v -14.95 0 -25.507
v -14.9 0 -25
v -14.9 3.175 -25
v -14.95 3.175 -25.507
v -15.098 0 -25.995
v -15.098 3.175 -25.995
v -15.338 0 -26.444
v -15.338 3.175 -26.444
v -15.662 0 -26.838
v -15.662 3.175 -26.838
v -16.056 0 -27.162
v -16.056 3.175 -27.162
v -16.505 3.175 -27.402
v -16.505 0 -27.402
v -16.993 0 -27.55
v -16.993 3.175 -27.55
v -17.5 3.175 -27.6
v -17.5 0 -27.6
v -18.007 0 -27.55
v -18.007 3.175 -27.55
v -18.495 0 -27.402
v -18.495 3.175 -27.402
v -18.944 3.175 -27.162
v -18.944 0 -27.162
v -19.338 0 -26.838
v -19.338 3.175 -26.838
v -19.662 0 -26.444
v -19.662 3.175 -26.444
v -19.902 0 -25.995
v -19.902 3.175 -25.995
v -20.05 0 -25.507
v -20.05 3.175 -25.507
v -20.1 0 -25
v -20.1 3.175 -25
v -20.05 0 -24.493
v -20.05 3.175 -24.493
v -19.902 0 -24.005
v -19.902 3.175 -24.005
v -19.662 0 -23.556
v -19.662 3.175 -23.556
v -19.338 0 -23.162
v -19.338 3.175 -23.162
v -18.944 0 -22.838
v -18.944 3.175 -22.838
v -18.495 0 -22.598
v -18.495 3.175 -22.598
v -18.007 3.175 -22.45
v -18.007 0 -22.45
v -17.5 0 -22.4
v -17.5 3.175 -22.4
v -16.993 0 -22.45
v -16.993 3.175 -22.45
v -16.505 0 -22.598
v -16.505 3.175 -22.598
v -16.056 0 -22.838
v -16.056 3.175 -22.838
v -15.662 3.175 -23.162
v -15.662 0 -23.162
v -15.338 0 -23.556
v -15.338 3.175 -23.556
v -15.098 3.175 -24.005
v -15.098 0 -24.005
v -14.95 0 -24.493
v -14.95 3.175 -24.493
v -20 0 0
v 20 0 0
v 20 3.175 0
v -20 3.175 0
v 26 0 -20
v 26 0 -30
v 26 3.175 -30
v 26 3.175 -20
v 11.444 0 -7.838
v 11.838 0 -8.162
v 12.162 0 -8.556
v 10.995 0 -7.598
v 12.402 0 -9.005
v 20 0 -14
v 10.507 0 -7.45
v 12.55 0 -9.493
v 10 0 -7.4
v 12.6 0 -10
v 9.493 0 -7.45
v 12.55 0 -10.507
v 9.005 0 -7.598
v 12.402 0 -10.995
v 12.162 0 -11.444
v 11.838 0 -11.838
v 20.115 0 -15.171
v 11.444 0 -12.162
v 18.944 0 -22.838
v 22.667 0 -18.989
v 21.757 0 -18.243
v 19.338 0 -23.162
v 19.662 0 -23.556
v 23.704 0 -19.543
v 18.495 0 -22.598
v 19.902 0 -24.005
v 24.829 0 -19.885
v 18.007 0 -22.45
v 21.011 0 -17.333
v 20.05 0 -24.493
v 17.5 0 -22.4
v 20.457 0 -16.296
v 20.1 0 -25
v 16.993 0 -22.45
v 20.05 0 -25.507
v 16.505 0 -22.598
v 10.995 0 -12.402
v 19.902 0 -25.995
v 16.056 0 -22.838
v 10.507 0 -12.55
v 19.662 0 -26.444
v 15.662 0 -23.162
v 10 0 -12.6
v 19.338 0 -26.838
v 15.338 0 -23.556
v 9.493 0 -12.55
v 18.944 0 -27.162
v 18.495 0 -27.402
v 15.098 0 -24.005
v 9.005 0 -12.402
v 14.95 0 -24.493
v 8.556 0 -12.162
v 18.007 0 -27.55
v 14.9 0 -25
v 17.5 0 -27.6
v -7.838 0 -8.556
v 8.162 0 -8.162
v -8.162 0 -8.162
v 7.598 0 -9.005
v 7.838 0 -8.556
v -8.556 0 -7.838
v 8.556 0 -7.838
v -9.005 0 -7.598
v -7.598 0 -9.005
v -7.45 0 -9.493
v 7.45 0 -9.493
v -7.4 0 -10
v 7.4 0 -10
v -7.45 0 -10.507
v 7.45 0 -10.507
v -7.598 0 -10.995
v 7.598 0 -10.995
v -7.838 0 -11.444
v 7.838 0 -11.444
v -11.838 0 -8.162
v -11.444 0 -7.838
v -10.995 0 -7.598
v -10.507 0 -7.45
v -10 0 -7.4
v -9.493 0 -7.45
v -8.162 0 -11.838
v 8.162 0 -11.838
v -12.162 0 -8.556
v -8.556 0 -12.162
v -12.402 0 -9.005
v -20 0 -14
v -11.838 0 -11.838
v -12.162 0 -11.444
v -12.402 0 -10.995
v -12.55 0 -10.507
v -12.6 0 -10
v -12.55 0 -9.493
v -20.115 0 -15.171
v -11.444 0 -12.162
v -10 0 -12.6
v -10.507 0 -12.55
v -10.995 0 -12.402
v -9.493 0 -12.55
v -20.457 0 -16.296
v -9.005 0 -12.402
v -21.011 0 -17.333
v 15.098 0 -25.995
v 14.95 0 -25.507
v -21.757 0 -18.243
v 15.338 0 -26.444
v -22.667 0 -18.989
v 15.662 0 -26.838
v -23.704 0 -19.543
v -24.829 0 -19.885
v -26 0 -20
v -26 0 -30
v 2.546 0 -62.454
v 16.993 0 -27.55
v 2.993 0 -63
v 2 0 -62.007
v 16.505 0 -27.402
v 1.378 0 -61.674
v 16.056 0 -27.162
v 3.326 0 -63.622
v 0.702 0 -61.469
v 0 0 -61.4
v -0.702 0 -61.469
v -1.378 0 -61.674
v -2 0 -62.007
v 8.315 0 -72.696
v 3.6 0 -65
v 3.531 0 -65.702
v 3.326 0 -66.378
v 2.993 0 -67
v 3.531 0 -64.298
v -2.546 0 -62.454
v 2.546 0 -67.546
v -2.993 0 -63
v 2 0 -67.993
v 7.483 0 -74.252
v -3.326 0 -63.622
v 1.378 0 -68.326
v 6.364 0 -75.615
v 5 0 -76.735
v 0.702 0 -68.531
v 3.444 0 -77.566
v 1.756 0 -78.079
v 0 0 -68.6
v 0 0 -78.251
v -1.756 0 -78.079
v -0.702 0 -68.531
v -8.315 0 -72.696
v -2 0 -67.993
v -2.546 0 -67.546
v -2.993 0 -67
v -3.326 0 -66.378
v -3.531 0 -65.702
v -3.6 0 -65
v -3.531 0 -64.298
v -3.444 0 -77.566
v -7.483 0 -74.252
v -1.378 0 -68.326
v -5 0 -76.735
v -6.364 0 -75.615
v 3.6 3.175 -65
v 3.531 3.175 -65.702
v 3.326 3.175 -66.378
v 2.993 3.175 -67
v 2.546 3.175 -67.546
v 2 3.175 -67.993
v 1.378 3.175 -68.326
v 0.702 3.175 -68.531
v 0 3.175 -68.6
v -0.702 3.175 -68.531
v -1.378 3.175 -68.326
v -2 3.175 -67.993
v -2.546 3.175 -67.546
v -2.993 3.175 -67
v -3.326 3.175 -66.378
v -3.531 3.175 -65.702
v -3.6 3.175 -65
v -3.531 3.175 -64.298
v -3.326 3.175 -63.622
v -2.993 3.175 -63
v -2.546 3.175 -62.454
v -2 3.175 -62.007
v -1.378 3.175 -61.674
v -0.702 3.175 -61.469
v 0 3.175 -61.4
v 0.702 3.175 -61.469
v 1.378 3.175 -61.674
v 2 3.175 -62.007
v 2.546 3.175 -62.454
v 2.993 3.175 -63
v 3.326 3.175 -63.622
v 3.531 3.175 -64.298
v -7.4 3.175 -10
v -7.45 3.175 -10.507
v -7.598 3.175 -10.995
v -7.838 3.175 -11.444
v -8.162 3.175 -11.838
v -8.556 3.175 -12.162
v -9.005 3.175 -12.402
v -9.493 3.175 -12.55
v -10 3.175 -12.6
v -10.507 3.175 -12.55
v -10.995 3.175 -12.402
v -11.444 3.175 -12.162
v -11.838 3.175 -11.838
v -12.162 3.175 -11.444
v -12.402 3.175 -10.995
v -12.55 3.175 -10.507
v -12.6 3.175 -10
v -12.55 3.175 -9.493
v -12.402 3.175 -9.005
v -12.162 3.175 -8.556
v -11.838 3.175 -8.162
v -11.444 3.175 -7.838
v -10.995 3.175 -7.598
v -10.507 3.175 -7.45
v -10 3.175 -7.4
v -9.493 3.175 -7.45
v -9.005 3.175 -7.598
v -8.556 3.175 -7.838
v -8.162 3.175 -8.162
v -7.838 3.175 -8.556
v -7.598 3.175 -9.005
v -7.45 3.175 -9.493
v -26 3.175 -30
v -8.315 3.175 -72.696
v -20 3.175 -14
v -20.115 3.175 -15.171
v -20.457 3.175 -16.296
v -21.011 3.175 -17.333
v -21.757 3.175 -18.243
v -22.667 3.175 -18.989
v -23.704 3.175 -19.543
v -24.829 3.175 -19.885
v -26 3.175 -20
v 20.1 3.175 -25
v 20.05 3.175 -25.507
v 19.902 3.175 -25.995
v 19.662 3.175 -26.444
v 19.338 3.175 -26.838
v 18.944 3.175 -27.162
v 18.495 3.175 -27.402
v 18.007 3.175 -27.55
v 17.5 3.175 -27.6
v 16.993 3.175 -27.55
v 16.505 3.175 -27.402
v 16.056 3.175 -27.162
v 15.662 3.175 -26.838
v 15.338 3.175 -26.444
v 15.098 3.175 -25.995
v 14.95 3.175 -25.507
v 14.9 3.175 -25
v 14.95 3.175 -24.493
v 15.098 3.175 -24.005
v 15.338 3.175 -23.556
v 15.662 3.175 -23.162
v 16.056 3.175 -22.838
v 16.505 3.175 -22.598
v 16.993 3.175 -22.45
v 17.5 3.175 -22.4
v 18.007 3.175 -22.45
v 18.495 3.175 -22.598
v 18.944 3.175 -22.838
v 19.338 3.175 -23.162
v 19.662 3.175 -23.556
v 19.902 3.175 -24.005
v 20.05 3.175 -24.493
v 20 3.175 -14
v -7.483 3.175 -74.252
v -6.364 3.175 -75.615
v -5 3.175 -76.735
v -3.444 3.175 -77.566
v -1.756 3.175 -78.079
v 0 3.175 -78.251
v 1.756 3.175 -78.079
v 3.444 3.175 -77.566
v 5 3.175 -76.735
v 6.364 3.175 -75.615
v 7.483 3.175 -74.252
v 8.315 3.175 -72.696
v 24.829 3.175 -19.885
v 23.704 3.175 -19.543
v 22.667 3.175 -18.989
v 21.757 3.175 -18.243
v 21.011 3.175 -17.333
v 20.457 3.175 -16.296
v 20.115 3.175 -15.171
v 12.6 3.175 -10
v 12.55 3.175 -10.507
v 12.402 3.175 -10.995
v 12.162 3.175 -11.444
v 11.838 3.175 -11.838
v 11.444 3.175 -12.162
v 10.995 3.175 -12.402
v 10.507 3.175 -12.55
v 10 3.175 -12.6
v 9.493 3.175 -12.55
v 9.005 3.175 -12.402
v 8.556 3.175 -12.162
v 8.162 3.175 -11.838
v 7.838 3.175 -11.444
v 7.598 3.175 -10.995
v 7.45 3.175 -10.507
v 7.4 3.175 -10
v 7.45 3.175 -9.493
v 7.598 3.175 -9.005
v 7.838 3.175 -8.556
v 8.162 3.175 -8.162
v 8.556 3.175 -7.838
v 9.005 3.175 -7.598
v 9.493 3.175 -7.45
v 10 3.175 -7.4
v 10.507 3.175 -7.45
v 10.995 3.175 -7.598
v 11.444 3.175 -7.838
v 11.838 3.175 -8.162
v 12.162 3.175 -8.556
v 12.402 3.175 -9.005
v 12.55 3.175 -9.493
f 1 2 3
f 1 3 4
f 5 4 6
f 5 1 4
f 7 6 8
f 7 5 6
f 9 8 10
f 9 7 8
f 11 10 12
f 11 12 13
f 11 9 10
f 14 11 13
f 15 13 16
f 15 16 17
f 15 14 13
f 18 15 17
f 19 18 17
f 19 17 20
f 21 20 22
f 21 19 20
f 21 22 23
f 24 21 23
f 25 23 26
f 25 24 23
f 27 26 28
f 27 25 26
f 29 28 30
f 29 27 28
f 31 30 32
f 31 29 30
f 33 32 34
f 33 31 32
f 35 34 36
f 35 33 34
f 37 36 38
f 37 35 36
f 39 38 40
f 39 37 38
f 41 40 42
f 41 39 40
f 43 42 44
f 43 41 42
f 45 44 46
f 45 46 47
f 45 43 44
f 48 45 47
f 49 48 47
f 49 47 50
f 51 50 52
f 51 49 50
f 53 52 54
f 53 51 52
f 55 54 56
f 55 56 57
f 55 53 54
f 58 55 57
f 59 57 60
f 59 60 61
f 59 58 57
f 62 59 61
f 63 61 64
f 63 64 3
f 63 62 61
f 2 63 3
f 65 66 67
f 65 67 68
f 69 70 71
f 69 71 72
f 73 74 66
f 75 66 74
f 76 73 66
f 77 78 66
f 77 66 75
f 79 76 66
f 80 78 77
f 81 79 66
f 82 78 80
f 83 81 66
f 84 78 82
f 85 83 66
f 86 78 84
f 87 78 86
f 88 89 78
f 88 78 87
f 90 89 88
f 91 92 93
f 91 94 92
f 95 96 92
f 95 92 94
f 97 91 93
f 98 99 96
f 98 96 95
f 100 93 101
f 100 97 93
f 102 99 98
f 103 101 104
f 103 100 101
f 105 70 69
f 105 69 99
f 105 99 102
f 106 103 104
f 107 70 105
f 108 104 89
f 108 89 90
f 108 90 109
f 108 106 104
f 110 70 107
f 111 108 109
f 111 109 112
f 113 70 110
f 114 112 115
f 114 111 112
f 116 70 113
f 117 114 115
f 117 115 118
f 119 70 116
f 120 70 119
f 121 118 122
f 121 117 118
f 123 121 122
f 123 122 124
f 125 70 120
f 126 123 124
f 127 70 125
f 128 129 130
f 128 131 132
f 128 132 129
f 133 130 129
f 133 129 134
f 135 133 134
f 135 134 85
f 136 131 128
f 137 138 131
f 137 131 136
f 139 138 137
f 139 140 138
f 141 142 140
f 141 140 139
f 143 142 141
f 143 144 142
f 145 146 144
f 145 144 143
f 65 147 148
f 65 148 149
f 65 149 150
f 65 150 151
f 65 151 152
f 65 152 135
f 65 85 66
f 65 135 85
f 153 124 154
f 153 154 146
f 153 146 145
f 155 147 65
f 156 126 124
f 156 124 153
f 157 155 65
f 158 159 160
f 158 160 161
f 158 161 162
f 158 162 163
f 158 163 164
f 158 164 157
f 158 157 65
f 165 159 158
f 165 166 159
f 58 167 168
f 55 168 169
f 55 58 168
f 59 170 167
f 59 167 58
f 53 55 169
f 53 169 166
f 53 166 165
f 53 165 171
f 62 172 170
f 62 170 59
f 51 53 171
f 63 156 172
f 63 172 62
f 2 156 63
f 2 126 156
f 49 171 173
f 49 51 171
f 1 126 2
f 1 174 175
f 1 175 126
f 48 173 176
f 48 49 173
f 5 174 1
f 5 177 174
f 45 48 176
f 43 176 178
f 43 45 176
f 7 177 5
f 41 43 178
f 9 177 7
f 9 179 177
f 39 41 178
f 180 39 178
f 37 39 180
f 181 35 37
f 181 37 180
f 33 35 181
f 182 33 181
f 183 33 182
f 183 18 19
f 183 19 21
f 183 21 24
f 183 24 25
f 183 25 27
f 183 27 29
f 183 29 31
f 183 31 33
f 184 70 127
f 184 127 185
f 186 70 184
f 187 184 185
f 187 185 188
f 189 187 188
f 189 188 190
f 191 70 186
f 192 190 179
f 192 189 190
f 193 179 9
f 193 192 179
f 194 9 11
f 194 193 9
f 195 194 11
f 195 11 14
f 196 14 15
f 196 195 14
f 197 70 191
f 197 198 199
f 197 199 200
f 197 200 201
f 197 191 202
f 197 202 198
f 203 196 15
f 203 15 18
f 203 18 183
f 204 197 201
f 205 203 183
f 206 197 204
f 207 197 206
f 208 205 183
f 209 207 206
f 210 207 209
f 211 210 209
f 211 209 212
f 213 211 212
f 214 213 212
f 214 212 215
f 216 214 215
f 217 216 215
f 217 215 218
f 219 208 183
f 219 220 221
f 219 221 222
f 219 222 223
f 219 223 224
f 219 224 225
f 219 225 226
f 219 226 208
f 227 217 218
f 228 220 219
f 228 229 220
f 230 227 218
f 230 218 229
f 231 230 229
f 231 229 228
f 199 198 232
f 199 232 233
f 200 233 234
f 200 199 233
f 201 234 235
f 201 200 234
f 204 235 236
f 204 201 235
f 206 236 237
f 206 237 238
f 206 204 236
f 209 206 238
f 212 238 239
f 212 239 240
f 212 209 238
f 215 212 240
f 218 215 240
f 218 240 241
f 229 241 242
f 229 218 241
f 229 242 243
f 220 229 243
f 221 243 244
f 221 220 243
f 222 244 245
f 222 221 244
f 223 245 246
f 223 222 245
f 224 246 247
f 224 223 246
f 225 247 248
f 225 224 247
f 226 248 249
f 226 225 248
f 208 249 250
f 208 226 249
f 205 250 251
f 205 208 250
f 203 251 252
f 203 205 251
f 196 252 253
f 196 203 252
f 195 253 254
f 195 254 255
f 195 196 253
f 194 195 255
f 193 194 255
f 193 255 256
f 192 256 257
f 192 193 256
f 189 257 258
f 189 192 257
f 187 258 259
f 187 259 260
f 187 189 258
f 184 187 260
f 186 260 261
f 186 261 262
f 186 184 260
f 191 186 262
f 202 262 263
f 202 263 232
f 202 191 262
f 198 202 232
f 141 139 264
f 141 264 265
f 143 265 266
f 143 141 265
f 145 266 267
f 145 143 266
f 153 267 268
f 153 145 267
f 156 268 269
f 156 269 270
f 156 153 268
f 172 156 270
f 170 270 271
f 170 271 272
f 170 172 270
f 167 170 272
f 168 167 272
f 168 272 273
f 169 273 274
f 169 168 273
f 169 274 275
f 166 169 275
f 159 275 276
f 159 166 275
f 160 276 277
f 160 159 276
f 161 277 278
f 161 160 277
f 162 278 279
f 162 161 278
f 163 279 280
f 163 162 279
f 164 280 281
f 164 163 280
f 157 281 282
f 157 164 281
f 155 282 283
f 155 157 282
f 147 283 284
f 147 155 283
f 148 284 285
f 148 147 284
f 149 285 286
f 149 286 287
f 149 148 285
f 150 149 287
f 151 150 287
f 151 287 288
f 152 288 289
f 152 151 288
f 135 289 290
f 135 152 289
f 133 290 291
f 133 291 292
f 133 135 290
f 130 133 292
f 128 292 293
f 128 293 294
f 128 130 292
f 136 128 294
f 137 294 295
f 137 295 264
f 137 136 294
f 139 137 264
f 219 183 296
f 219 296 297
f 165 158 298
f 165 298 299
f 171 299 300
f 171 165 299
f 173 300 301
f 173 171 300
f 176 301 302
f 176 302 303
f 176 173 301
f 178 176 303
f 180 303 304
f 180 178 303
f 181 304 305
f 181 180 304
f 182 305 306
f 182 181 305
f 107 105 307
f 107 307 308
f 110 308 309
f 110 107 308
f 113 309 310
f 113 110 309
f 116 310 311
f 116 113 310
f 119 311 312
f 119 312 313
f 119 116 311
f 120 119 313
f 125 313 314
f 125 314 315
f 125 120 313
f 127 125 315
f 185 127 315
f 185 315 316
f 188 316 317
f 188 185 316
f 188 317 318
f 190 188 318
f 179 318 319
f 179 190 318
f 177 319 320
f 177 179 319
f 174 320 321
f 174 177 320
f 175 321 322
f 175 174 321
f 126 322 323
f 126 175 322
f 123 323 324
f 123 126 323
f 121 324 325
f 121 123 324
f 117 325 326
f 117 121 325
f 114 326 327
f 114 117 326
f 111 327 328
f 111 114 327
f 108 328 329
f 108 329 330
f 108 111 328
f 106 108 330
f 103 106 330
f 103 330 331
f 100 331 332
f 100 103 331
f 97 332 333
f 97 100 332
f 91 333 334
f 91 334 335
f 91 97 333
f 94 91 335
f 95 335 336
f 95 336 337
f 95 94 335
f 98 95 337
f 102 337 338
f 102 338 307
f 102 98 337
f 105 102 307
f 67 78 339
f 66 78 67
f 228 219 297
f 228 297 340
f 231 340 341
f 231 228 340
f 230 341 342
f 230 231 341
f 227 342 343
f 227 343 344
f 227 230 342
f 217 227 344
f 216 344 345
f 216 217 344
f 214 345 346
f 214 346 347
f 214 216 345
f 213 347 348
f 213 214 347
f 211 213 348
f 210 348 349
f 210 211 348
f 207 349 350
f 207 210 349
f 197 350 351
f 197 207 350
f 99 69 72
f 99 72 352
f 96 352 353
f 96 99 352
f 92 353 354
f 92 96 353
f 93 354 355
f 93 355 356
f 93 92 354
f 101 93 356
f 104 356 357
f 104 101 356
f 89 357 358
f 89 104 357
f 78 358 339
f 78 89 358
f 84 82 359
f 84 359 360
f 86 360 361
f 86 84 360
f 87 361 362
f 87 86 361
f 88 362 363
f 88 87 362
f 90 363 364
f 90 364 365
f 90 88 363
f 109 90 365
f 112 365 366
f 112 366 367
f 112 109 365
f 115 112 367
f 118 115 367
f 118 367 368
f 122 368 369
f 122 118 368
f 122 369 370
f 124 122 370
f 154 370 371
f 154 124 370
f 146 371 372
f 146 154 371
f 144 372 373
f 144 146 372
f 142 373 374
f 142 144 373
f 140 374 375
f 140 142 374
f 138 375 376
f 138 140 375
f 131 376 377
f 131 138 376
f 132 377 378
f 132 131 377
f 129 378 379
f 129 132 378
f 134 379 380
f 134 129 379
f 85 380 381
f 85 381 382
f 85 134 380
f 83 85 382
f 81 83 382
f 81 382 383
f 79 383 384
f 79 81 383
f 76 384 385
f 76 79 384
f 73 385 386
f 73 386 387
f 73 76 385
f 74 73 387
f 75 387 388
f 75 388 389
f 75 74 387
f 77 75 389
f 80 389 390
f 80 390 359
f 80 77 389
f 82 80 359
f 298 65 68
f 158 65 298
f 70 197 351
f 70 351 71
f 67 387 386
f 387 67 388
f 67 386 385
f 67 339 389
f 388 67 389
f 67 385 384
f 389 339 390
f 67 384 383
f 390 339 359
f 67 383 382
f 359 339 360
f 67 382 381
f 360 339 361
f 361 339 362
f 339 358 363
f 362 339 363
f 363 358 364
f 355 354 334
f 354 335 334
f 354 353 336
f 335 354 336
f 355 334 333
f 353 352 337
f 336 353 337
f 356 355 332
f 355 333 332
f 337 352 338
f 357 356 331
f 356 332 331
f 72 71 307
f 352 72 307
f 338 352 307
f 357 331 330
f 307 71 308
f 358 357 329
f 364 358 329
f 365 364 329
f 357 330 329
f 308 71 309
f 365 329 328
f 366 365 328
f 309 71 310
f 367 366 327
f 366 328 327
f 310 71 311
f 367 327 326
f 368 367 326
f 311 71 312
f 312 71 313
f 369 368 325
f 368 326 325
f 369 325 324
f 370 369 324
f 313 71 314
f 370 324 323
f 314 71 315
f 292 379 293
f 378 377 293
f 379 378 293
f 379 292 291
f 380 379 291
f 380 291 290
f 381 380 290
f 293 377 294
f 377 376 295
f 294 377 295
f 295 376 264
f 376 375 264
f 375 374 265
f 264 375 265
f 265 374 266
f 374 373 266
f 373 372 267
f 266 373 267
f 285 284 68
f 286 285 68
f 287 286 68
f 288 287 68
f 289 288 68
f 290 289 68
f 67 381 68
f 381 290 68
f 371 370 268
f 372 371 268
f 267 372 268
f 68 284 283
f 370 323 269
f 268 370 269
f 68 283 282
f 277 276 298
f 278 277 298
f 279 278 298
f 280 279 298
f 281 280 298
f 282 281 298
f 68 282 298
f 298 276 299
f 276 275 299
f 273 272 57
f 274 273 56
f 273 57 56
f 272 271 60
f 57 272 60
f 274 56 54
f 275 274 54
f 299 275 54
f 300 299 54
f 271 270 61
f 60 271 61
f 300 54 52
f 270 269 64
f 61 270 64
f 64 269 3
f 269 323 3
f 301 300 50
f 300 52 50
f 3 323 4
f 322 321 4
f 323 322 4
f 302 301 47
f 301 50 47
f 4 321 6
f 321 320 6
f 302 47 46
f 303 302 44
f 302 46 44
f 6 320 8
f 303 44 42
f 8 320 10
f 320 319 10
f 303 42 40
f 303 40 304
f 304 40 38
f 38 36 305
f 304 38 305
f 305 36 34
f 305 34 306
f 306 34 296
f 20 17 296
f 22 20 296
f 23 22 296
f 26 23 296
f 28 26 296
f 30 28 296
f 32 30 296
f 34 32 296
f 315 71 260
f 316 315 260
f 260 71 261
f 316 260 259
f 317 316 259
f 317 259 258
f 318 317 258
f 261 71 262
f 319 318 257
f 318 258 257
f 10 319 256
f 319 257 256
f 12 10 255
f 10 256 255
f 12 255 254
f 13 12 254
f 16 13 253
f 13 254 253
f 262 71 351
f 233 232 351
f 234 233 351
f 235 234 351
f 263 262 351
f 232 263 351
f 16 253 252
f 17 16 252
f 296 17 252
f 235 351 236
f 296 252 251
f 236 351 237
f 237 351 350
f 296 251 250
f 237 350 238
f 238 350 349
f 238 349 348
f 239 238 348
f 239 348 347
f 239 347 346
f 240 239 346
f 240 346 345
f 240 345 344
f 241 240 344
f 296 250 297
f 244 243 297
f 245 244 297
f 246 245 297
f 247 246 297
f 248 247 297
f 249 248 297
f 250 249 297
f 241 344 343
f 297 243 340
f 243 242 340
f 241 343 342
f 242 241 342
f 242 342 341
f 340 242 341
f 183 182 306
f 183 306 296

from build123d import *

# Parameters (mm, degrees)
SKETCH1_R           = 2.6
SKETCH1_R_2         = 3.6
BOSS_EXTRUDE1_DEPTH = 3.175


with BuildPart() as part:
    # Sketch1 → Boss-Extrude1 (new body)
    with BuildSketch(Plane(origin=(0, 0, 0), x_dir=(1, 0, 0), z_dir=(0, 1, 0))):
        with BuildLine():
            Line((8.314915793, 72.695604767), (26, 30.000034622))
            Line((26, 30.000034622), (26, 20.000034622))
            ThreePointArc((26, 20.000034622), (21.757357213, 18.242652928), (20, 14))
            Line((20, 14), (20, 0))
            Line((20, 0), (-20, 0))
            Line((-20, 0), (-20, 14))
            ThreePointArc((-20, 14), (-21.757357213, 18.242652928), (-26, 20.000034622))
            Line((-26, 20.000034622), (-26, 30.000034622))
            Line((-26, 30.000034622), (-8.314915793, 72.695604767))
            ThreePointArc((-8.314915793, 72.695604767), (0, 78.251453876), (8.314915793, 72.695604767))
        make_face()
        with Locations((10, 10)):
            Circle(SKETCH1_R, mode=Mode.SUBTRACT)
        with Locations((-17.5, 25)):
            Circle(SKETCH1_R, mode=Mode.SUBTRACT)
        with Locations((0, 65)):
            Circle(SKETCH1_R_2, mode=Mode.SUBTRACT)
        with Locations((17.5, 25)):
            Circle(SKETCH1_R, mode=Mode.SUBTRACT)
        with Locations((-10, 10)):
            Circle(SKETCH1_R, mode=Mode.SUBTRACT)
    extrude(amount=BOSS_EXTRUDE1_DEPTH)


solid = part.part
